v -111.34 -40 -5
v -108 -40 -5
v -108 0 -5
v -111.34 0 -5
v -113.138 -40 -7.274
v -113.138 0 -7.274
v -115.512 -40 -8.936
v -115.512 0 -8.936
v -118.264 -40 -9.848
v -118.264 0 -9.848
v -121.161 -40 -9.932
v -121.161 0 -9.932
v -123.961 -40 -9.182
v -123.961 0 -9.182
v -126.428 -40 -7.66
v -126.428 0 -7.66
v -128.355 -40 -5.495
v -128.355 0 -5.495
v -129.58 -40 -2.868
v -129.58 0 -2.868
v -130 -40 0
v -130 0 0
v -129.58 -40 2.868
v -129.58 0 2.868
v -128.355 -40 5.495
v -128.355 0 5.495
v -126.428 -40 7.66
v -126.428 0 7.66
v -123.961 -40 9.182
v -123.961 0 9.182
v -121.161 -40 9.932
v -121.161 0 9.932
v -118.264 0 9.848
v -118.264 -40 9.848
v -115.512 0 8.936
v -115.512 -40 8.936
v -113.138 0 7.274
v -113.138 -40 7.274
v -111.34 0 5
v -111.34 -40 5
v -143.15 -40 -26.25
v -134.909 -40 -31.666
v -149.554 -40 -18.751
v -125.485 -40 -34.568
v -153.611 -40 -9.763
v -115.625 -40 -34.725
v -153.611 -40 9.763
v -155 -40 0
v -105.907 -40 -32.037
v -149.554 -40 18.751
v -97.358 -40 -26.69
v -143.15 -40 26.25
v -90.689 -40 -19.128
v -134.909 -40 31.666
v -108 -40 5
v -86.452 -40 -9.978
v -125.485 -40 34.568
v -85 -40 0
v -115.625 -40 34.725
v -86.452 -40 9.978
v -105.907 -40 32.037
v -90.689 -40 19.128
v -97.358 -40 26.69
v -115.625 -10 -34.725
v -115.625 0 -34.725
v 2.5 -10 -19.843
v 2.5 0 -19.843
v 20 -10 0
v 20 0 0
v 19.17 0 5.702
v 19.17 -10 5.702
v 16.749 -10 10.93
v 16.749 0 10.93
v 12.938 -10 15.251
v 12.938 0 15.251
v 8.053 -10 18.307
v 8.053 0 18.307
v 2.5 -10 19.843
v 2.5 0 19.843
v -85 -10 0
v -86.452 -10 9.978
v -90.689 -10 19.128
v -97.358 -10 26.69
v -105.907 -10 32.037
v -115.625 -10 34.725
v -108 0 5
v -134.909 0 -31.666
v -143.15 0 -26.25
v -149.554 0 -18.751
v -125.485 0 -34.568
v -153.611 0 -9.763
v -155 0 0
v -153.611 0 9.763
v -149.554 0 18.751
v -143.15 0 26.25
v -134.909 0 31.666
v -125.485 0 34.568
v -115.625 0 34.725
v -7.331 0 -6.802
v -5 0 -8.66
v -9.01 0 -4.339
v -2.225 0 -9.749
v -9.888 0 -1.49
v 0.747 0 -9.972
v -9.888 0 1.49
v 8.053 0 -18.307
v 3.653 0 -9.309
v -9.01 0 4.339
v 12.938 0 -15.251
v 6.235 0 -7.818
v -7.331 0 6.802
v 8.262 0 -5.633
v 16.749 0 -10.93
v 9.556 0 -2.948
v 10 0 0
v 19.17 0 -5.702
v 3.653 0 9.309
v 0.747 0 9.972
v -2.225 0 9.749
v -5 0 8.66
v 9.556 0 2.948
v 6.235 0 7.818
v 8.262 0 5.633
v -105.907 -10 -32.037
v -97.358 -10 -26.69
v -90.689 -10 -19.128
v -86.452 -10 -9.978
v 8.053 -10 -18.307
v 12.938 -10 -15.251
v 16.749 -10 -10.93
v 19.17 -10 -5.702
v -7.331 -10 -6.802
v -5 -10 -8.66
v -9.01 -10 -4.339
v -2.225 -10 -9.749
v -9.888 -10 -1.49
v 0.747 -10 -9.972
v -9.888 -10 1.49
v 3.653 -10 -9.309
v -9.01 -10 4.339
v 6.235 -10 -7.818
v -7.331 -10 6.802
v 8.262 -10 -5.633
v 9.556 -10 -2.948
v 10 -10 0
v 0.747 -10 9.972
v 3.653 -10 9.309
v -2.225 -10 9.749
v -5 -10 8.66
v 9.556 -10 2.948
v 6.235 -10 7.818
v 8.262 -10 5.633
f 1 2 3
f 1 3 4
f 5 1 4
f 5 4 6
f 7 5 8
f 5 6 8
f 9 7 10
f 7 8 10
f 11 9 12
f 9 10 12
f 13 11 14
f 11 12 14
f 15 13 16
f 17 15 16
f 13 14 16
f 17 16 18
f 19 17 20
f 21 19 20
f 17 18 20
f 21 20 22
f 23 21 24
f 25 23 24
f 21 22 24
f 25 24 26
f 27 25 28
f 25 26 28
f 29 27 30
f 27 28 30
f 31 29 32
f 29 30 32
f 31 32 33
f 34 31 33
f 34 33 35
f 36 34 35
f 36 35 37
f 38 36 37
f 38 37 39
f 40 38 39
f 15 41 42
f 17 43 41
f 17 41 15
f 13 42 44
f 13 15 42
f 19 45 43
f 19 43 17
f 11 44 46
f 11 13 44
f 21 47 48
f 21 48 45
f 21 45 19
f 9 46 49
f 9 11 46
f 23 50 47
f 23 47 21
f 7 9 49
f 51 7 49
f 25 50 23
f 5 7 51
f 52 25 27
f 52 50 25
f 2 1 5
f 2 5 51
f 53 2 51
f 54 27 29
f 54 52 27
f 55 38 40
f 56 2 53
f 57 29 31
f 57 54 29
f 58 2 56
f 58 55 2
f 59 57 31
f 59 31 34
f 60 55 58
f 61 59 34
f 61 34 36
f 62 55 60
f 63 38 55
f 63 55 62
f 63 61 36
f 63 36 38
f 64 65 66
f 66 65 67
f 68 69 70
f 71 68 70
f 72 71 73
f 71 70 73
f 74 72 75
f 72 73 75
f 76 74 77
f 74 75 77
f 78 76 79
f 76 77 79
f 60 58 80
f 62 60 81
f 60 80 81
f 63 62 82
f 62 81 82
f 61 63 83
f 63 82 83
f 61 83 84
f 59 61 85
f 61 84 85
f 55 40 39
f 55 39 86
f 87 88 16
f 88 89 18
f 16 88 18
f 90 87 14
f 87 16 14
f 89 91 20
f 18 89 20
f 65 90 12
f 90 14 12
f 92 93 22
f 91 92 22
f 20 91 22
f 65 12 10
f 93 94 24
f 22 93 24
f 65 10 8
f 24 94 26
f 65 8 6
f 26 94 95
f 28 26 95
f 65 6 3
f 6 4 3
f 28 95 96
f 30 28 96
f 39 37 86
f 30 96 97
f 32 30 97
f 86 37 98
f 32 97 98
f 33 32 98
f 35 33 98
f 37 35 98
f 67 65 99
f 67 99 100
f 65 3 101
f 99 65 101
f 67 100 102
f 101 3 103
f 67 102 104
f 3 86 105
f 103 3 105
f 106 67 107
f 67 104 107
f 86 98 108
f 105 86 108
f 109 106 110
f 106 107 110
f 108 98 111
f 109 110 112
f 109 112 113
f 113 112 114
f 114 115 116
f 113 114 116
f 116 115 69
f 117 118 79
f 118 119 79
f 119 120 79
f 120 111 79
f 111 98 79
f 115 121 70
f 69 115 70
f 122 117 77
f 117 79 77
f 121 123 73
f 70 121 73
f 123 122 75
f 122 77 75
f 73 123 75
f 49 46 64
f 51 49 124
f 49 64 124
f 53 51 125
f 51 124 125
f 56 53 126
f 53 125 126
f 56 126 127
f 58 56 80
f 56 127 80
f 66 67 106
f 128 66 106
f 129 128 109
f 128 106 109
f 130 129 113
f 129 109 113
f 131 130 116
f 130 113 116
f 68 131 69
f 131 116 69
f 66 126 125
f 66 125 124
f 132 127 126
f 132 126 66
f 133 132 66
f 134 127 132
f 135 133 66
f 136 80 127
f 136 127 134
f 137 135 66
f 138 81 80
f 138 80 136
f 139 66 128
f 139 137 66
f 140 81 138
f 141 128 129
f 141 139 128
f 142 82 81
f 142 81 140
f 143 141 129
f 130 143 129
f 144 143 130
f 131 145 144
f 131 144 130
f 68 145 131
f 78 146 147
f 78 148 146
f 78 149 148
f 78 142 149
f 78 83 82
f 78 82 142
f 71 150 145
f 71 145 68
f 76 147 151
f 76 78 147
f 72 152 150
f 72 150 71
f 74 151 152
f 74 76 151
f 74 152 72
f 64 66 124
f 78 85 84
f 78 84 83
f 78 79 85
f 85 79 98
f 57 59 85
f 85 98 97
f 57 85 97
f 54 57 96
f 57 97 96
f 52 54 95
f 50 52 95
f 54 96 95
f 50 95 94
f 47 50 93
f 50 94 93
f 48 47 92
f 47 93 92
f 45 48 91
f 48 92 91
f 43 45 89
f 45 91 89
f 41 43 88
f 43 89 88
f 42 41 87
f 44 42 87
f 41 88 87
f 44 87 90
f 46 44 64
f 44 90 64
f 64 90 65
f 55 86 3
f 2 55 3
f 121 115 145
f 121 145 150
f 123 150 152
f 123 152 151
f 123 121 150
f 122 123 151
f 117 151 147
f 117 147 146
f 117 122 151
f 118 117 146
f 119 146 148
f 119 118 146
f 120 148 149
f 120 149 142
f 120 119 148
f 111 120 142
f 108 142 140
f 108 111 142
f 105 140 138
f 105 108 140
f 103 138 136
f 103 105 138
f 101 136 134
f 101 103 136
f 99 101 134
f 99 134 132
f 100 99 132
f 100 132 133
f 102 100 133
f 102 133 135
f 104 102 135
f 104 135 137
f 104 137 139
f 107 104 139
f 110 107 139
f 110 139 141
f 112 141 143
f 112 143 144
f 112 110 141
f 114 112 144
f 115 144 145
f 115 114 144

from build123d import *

# Parameters (mm, degrees)
F1_DEPTH = 40
F0_R     = 10
F2_DEPTH = 10


with BuildPart() as f1:
    # F0 (on Front) → F1 (new body)
    with BuildSketch(Plane.XZ):
        with BuildLine():
            ThreePointArc((-85, 0), (-93.75, 23.150324), (-115.625, 34.725486))
            ThreePointArc((-115.625, 34.725486), (-155, 0), (-115.625, -34.725486))
            ThreePointArc((-115.625, -34.725486), (-93.75, -23.150324), (-85, 0))
        make_face()
        with BuildLine():
            ThreePointArc((-111.339746, -5), (-130, 0), (-111.339746, 5))
            Line((-111.339746, 5), (-108, 5))
            Line((-108, 5), (-108, -5))
            Line((-108, -5), (-111.339746, -5))
        make_face(mode=Mode.SUBTRACT)
    extrude(amount=F1_DEPTH)

    # F0 (on Front) → F2 (join)
    with BuildSketch(Plane.XZ):
        with BuildLine():
            ThreePointArc((2.5, -19.843135), (15, -13.228757), (20, 0))
            ThreePointArc((20, 0), (15, 13.228757), (2.5, 19.843135))
            ThreePointArc((2.5, 19.843135), (-20, 0), (2.5, -19.843135))
        make_face()
        Circle(F0_R, mode=Mode.SUBTRACT)
        with BuildLine():
            ThreePointArc((2.5, -19.843135), (-20, 0), (2.5, 19.843135))
            Line((2.5, 19.843135), (-115.625, 34.725486))
            ThreePointArc((-115.625, 34.725486), (-93.75, 23.150324), (-85, 0))
            ThreePointArc((-85, 0), (-93.75, -23.150324), (-115.625, -34.725486))
            Line((-115.625, -34.725486), (2.5, -19.843135))
        make_face()
        with BuildLine():
            ThreePointArc((-85, 0), (-93.75, 23.150324), (-115.625, 34.725486))
            ThreePointArc((-115.625, 34.725486), (-155, 0), (-115.625, -34.725486))
            ThreePointArc((-115.625, -34.725486), (-93.75, -23.150324), (-85, 0))
        make_face()
        with BuildLine():
            ThreePointArc((-111.339746, -5), (-130, 0), (-111.339746, 5))
            Line((-111.339746, 5), (-108, 5))
            Line((-108, 5), (-108, -5))
            Line((-108, -5), (-111.339746, -5))
        make_face(mode=Mode.SUBTRACT)
    extrude(amount=F2_DEPTH)


solid = f1.part
